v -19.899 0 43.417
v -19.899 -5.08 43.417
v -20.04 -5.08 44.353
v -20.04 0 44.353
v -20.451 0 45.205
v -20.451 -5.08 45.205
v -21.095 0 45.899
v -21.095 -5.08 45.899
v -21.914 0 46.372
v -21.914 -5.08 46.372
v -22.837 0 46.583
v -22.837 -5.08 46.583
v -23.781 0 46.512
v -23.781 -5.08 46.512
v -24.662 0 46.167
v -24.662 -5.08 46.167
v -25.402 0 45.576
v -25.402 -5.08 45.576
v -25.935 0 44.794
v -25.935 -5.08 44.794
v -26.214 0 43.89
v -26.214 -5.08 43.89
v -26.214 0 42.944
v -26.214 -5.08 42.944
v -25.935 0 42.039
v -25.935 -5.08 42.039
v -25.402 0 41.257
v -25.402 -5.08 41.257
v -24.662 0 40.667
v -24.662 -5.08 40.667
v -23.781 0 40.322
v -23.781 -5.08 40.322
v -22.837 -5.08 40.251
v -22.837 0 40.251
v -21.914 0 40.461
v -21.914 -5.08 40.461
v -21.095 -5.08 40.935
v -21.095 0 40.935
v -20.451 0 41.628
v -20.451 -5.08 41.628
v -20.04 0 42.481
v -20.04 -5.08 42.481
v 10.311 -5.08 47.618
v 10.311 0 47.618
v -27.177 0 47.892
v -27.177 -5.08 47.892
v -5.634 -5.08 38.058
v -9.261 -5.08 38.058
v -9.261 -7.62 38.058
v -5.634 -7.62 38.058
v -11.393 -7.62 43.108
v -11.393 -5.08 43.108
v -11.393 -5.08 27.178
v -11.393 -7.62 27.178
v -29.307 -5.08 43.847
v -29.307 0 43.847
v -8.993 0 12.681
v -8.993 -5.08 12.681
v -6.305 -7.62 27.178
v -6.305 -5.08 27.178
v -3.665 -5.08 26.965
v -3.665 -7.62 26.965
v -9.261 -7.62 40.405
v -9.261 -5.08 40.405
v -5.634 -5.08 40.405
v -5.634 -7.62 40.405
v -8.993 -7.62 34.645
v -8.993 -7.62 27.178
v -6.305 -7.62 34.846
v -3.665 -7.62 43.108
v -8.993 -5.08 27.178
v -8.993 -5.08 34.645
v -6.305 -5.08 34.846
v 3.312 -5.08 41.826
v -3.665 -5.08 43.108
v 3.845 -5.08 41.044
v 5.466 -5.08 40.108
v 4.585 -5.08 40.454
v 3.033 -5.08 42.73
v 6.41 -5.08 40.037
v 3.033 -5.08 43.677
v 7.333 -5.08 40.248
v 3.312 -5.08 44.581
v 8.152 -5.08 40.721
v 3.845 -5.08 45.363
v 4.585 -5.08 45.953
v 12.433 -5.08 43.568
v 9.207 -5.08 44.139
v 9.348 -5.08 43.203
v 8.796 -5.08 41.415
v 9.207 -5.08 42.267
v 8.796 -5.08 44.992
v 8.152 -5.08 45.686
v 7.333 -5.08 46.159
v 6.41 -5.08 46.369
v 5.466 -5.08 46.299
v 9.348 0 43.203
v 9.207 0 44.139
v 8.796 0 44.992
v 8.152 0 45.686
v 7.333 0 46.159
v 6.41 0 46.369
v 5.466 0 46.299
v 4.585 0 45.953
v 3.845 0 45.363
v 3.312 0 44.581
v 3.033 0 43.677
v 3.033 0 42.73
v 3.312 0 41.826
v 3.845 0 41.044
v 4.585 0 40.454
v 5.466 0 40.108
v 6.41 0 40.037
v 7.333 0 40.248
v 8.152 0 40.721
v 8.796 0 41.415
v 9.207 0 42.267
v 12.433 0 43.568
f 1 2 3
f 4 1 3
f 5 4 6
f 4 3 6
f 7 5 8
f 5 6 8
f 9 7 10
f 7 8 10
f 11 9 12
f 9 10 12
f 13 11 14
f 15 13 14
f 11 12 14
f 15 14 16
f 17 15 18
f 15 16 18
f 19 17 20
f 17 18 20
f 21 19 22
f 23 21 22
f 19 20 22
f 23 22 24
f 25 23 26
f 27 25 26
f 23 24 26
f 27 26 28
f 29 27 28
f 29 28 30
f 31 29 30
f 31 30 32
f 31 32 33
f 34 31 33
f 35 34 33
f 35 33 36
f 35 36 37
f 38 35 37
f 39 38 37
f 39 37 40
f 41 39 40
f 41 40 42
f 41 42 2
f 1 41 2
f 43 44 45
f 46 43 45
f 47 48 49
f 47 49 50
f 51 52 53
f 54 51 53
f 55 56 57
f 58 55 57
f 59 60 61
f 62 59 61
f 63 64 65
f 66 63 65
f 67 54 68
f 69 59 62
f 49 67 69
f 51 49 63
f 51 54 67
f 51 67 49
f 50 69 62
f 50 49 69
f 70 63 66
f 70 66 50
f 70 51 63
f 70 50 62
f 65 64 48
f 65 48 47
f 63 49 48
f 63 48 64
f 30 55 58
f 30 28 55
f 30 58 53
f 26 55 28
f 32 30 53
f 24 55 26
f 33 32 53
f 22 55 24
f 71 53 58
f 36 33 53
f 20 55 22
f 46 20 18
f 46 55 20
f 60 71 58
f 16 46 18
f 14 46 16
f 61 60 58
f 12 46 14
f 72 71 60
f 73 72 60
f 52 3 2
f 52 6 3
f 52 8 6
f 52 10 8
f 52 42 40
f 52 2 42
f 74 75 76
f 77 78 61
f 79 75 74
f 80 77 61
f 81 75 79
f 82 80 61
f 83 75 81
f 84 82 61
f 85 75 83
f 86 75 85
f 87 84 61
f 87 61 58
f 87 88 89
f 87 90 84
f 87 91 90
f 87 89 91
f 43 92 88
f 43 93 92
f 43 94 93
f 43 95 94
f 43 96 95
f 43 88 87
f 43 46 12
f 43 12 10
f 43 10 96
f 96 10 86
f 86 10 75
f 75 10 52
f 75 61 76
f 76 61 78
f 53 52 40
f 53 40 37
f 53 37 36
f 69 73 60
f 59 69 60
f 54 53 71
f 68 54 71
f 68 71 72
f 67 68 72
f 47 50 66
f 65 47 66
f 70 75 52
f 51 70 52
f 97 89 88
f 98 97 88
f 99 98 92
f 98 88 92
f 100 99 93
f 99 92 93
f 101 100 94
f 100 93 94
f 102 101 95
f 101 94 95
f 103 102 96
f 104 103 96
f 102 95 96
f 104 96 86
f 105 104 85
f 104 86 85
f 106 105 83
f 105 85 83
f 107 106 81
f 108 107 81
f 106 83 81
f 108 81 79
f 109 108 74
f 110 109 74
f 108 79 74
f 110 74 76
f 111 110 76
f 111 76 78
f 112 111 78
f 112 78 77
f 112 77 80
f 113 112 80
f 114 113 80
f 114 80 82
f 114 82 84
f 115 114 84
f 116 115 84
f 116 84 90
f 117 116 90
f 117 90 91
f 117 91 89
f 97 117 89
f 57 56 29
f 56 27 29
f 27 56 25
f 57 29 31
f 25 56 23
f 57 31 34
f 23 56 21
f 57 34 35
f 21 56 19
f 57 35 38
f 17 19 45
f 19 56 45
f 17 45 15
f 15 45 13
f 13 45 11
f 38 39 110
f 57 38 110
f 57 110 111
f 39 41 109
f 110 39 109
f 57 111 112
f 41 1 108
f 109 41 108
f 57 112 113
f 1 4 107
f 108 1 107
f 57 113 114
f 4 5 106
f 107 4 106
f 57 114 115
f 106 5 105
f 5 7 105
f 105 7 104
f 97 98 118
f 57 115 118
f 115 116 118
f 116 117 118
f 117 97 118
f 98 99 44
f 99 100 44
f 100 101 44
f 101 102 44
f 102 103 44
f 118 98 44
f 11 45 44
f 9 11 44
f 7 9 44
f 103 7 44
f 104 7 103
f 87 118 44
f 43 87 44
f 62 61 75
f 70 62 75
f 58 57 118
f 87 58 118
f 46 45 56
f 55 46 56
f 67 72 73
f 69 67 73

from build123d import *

# Parameters (mm, degrees)
F1_DEPTH = 5.08
F2_R     = 3.175
F3_DEPTH = 5.081
F4_W     = 3.626744
F4_H     = 2.346717
F5_DEPTH = 2.54


with BuildPart() as f1:
    # F0 (on Front) → F1 (new body)
    with BuildSketch(Plane.XZ):
        Polygon((-27.176633, 47.891983), (-29.307042, 43.846673), (-8.993444, 12.680604), (12.433227, 43.568405), (10.31143, 47.61824), align=None)
    extrude(amount=F1_DEPTH)

    # F2 (on face) → F3 (cut, through all)
    with BuildSketch(Plane.XZ.offset(5.08)):
        with Locations((6.172628, 43.203343)):
            Circle(F2_R)
        with Locations((-23.074293, 43.416909)):
            Circle(F2_R)
    extrude(amount=-F3_DEPTH, mode=Mode.SUBTRACT)

    # F4 (on face) → F5 (join)
    with BuildSketch(Plane.XZ.offset(5.08)):
        Polygon((-3.665128, 43.108057), (-11.393237, 43.108057), (-11.393237, 27.177891), (-8.993444, 27.177891), (-8.993444, 34.644719), (-6.305161, 34.846445), (-6.305161, 27.177891), (-3.665128, 26.964553), align=None)
        with Locations((-7.447374, 39.231487)):
            Rectangle(F4_W, F4_H, mode=Mode.SUBTRACT)
    extrude(amount=F5_DEPTH)


solid = f1.part
